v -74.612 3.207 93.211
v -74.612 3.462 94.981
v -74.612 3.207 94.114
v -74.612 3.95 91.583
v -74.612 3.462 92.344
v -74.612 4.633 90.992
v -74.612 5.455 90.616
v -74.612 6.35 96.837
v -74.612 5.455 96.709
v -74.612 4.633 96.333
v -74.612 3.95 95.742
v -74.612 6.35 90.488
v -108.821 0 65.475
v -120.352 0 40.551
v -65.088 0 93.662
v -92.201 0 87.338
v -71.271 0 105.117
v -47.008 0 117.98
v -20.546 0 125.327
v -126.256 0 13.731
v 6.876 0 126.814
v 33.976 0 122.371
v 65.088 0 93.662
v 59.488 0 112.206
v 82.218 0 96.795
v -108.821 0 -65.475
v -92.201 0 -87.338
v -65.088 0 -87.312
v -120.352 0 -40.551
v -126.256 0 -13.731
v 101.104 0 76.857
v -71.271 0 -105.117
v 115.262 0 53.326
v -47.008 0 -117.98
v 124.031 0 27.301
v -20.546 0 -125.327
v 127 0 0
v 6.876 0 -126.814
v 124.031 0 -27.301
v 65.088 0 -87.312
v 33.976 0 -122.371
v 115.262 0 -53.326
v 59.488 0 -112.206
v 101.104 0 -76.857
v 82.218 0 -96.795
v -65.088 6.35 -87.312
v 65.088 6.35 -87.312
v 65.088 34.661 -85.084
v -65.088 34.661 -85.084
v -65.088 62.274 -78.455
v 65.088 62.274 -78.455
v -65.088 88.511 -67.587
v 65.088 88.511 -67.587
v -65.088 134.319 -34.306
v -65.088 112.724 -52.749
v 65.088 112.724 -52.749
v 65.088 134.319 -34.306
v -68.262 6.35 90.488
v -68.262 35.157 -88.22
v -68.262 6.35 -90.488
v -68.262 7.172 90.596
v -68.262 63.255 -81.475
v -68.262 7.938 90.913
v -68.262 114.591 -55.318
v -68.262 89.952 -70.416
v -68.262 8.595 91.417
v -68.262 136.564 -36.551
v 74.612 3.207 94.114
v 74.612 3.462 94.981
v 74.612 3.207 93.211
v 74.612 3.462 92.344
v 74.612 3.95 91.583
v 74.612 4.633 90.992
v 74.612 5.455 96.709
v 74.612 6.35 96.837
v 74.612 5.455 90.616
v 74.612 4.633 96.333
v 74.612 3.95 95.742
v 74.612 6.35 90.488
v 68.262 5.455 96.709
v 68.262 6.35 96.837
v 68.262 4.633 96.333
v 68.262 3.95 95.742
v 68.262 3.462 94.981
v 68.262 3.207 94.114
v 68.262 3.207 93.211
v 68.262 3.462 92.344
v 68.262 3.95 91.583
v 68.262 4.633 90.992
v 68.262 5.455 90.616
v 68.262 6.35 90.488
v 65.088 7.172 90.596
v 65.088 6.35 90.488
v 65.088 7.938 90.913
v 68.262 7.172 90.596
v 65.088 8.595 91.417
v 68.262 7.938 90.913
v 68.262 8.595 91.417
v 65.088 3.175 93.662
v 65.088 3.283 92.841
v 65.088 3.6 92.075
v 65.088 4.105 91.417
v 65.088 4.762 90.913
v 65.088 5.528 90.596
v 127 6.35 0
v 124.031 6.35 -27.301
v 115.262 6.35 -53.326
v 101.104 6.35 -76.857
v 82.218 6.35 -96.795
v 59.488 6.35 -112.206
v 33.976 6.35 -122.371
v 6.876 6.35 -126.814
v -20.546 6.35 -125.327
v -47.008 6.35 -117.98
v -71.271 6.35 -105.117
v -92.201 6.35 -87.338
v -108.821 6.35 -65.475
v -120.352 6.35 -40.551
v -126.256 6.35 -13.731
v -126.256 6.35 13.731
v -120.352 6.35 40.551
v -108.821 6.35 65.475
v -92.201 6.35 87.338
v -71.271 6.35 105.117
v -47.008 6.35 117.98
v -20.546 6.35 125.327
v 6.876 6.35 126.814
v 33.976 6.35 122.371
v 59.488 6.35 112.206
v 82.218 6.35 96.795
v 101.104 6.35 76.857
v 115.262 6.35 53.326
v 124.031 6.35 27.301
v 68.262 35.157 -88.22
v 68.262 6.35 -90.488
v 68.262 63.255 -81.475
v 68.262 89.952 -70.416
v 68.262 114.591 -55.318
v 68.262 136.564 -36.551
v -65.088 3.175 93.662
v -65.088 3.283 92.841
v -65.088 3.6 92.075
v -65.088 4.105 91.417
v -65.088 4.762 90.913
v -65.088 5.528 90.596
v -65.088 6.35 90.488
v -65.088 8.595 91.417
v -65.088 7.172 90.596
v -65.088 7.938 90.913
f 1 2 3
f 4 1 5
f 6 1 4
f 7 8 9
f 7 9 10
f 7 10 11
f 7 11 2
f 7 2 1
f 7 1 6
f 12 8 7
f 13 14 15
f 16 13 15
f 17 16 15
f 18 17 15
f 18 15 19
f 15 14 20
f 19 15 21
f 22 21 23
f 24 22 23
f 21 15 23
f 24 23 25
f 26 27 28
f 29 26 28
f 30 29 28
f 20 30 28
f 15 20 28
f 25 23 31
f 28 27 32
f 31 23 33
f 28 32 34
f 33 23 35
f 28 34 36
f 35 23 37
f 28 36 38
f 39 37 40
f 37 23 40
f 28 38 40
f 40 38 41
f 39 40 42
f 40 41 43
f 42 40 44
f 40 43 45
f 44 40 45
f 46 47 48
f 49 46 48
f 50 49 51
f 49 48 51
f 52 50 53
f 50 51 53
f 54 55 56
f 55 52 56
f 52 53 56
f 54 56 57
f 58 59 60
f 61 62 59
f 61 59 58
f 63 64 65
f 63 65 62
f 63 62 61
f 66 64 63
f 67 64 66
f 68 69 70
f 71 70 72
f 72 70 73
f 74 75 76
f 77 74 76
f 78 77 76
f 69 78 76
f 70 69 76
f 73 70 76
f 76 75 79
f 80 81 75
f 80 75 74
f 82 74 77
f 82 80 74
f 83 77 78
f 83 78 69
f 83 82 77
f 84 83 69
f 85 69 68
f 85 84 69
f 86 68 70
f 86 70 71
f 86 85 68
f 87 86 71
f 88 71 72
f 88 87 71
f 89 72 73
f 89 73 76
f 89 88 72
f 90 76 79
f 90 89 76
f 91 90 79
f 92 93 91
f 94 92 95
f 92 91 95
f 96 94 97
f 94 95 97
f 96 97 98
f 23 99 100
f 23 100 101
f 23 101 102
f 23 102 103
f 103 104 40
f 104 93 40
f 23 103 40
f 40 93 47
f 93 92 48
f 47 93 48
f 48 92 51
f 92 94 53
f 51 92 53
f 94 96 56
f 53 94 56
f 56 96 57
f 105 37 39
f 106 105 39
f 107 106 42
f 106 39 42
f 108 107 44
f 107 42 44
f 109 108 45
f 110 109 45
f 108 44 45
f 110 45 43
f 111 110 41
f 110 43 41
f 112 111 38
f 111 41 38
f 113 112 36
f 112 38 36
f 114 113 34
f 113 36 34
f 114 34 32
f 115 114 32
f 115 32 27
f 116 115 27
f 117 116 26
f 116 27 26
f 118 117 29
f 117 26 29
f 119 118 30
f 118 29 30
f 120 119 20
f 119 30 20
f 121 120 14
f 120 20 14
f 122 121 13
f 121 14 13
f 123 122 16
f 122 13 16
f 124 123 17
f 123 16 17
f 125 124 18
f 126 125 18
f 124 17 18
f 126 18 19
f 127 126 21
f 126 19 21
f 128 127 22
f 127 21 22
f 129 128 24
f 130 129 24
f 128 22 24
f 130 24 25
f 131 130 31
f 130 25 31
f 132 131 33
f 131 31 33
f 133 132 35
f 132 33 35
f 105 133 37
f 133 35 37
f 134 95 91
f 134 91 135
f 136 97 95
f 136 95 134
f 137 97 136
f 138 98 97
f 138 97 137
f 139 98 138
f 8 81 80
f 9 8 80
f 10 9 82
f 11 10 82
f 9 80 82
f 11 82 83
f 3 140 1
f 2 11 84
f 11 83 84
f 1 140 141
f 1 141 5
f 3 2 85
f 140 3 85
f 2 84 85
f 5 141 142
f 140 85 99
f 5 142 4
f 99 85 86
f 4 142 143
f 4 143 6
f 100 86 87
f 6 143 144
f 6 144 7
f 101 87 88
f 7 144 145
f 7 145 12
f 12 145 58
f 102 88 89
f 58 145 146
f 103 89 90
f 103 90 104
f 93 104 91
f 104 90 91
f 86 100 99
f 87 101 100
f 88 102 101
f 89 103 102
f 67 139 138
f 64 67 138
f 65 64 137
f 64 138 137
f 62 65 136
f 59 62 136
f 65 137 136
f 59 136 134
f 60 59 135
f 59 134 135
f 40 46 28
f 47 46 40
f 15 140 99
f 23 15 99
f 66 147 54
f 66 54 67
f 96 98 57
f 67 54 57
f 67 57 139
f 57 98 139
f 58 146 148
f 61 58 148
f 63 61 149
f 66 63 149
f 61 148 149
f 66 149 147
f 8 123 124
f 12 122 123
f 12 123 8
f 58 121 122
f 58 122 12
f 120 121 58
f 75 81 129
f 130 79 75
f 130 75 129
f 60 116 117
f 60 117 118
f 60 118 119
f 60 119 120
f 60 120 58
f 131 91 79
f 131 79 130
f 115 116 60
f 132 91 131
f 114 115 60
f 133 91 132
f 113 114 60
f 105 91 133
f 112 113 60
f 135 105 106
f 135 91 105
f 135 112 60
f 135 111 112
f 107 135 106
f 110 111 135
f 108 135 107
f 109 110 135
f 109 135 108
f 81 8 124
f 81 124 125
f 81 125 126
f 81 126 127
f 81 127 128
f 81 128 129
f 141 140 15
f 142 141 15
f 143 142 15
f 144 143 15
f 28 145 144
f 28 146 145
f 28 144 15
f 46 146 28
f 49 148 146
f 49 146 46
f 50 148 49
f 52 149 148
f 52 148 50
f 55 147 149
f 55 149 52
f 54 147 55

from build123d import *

# Parameters (mm, degrees)
SKETCH1_R               = 127
BOSS_EXTRUDE1_DEPTH     = 6.35
SKETCH2_W               = 136.525
SKETCH2_H               = 187.325
SKETCH2_W_2             = 130.175
SKETCH2_H_2             = 180.975
BOSS_EXTRUDE2_DEPTH     = 180.975
CUT_EXTRUDE1_REACH      = 197.262
CUT_EXTRUDE2_REACH      = 222.663
SKETCH6_W               = 130.175
SKETCH6_H               = 180.975
CUT_EXTRUDE3_REACH      = 8.35
SKETCH7_W               = 130.175
SKETCH7_H               = 180.975
BOSS_EXTRUDE3_DEPTH     = 136.525
CUT_EXTRUDE4_DEPTH      = 136.525
SKETCH15_R              = 3.175
CUT_EXTRUDE5_DEPTH      = 6.35
CUT_EXTRUDE5_DEPTH_BACK = 142.875


with BuildPart() as part:
    # Sketch1 → Boss-Extrude1 (new body)
    with BuildSketch(Plane(origin=(0, 0, 0), x_dir=(1, 0, 0), z_dir=(0, 1, 0))):
        Circle(SKETCH1_R)
    extrude(amount=BOSS_EXTRUDE1_DEPTH)

    # Sketch2 → Boss-Extrude2 (add)
    with BuildSketch(Plane(origin=(0, 6.35, 0), x_dir=(1, 0, 0), z_dir=(0, 1, 0))):
        Rectangle(SKETCH2_W, SKETCH2_H)
        Rectangle(SKETCH2_W_2, SKETCH2_H_2, mode=Mode.SUBTRACT)
    extrude(amount=BOSS_EXTRUDE2_DEPTH)

    # Sketch3 → Cut-Extrude1 (cut, up to next)
    with BuildSketch(Plane(origin=(68.2625, 0, 0), x_dir=(0, 0, -1), z_dir=(1, 0, 0)), mode=Mode.PRIVATE) as cut_extrude1_sk1:
        with BuildLine():
            Line((-93.6625, 187.325), (93.6625, 187.325))
            Line((93.6625, 187.325), (93.6625, 6.35))
            Line((93.6625, 6.35), (87.3125, 6.35))
            ThreePointArc((87.3125, 6.35), (34.306149725, 134.318649725), (-93.6625, 187.325))
        make_face()
    cut_extrude1_tool1 = extrude(cut_extrude1_sk1.sketch, amount=-CUT_EXTRUDE1_REACH, mode=Mode.PRIVATE) & part.part
    add(cut_extrude1_tool1.solids().sort_by_distance((68.2625, 139.865797, -53.015255))[0], mode=Mode.SUBTRACT)

    # Sketch6 → Cut-Extrude2 (cut, up to next)
    with BuildSketch(Plane.XY.offset(93.6625), mode=Mode.PRIVATE) as cut_extrude2_sk1:
        with Locations((0, 96.8375)):
            Rectangle(SKETCH6_W, SKETCH6_H)
    cut_extrude2_tool1 = extrude(cut_extrude2_sk1.sketch, amount=-CUT_EXTRUDE2_REACH, mode=Mode.PRIVATE) & part.part
    add(cut_extrude2_tool1.solids().sort_by_distance((0, 96.8375, 93.6625))[0], mode=Mode.SUBTRACT)

    # Sketch7 → Cut-Extrude3 (cut, up to next)
    with BuildSketch(Plane(origin=(0, 6.35, 0), x_dir=(1, 0, 0), z_dir=(0, 1, 0)), mode=Mode.PRIVATE) as cut_extrude3_sk1:
        with Locations((0, -3.175)):
            Rectangle(SKETCH7_W, SKETCH7_H)
    cut_extrude3_tool1 = extrude(cut_extrude3_sk1.sketch, amount=-CUT_EXTRUDE3_REACH, mode=Mode.PRIVATE) & part.part
    add(cut_extrude3_tool1.solids().sort_by_distance((0, 6.35, 3.175))[0], mode=Mode.SUBTRACT)

    # Sketch10 → Boss-Extrude3 (add)
    with BuildSketch(Plane(origin=(68.2625, 0, 0), x_dir=(0, 0, -1), z_dir=(1, 0, 0))):
        with BuildLine():
            Line((-93.6625, 187.325), (-93.6625, 190.5))
            ThreePointArc((-93.6625, 190.5), (36.551213756, 136.563713756), (90.4875, 6.35))
            Line((90.4875, 6.35), (87.3125, 6.35))
            ThreePointArc((87.3125, 6.35), (34.306149725, 134.318649725), (-93.6625, 187.325))
        make_face()
    extrude(amount=-BOSS_EXTRUDE3_DEPTH)

    # Sketch12 → Cut-Extrude4 (cut)
    with BuildSketch(Plane(origin=(68.2625, 0, 0), x_dir=(0, 0, -1), z_dir=(1, 0, 0))):
        with BuildLine():
            Line((-93.6625, 6.35), (36.551213756, 136.563713756))
            ThreePointArc((36.551213756, 136.563713756), (-23.19134593, 176.482415912), (-93.6625, 190.5))
            Line((-93.6625, 190.5), (-93.6625, 6.35))
        make_face()
    extrude(amount=-CUT_EXTRUDE4_DEPTH, mode=Mode.SUBTRACT)

    # Sketch15 → Cut-Extrude5 (cut, two sides)
    with BuildSketch(Plane(origin=(68.2625, 0, 0), x_dir=(0, 0, -1), z_dir=(1, 0, 0))) as cut_extrude5_sk:
        with Locations((-93.6625, 6.35)):
            Circle(SKETCH15_R)
    extrude(amount=CUT_EXTRUDE5_DEPTH, mode=Mode.SUBTRACT)
    extrude(cut_extrude5_sk.sketch, amount=-CUT_EXTRUDE5_DEPTH_BACK, mode=Mode.SUBTRACT)


solid = part.part
